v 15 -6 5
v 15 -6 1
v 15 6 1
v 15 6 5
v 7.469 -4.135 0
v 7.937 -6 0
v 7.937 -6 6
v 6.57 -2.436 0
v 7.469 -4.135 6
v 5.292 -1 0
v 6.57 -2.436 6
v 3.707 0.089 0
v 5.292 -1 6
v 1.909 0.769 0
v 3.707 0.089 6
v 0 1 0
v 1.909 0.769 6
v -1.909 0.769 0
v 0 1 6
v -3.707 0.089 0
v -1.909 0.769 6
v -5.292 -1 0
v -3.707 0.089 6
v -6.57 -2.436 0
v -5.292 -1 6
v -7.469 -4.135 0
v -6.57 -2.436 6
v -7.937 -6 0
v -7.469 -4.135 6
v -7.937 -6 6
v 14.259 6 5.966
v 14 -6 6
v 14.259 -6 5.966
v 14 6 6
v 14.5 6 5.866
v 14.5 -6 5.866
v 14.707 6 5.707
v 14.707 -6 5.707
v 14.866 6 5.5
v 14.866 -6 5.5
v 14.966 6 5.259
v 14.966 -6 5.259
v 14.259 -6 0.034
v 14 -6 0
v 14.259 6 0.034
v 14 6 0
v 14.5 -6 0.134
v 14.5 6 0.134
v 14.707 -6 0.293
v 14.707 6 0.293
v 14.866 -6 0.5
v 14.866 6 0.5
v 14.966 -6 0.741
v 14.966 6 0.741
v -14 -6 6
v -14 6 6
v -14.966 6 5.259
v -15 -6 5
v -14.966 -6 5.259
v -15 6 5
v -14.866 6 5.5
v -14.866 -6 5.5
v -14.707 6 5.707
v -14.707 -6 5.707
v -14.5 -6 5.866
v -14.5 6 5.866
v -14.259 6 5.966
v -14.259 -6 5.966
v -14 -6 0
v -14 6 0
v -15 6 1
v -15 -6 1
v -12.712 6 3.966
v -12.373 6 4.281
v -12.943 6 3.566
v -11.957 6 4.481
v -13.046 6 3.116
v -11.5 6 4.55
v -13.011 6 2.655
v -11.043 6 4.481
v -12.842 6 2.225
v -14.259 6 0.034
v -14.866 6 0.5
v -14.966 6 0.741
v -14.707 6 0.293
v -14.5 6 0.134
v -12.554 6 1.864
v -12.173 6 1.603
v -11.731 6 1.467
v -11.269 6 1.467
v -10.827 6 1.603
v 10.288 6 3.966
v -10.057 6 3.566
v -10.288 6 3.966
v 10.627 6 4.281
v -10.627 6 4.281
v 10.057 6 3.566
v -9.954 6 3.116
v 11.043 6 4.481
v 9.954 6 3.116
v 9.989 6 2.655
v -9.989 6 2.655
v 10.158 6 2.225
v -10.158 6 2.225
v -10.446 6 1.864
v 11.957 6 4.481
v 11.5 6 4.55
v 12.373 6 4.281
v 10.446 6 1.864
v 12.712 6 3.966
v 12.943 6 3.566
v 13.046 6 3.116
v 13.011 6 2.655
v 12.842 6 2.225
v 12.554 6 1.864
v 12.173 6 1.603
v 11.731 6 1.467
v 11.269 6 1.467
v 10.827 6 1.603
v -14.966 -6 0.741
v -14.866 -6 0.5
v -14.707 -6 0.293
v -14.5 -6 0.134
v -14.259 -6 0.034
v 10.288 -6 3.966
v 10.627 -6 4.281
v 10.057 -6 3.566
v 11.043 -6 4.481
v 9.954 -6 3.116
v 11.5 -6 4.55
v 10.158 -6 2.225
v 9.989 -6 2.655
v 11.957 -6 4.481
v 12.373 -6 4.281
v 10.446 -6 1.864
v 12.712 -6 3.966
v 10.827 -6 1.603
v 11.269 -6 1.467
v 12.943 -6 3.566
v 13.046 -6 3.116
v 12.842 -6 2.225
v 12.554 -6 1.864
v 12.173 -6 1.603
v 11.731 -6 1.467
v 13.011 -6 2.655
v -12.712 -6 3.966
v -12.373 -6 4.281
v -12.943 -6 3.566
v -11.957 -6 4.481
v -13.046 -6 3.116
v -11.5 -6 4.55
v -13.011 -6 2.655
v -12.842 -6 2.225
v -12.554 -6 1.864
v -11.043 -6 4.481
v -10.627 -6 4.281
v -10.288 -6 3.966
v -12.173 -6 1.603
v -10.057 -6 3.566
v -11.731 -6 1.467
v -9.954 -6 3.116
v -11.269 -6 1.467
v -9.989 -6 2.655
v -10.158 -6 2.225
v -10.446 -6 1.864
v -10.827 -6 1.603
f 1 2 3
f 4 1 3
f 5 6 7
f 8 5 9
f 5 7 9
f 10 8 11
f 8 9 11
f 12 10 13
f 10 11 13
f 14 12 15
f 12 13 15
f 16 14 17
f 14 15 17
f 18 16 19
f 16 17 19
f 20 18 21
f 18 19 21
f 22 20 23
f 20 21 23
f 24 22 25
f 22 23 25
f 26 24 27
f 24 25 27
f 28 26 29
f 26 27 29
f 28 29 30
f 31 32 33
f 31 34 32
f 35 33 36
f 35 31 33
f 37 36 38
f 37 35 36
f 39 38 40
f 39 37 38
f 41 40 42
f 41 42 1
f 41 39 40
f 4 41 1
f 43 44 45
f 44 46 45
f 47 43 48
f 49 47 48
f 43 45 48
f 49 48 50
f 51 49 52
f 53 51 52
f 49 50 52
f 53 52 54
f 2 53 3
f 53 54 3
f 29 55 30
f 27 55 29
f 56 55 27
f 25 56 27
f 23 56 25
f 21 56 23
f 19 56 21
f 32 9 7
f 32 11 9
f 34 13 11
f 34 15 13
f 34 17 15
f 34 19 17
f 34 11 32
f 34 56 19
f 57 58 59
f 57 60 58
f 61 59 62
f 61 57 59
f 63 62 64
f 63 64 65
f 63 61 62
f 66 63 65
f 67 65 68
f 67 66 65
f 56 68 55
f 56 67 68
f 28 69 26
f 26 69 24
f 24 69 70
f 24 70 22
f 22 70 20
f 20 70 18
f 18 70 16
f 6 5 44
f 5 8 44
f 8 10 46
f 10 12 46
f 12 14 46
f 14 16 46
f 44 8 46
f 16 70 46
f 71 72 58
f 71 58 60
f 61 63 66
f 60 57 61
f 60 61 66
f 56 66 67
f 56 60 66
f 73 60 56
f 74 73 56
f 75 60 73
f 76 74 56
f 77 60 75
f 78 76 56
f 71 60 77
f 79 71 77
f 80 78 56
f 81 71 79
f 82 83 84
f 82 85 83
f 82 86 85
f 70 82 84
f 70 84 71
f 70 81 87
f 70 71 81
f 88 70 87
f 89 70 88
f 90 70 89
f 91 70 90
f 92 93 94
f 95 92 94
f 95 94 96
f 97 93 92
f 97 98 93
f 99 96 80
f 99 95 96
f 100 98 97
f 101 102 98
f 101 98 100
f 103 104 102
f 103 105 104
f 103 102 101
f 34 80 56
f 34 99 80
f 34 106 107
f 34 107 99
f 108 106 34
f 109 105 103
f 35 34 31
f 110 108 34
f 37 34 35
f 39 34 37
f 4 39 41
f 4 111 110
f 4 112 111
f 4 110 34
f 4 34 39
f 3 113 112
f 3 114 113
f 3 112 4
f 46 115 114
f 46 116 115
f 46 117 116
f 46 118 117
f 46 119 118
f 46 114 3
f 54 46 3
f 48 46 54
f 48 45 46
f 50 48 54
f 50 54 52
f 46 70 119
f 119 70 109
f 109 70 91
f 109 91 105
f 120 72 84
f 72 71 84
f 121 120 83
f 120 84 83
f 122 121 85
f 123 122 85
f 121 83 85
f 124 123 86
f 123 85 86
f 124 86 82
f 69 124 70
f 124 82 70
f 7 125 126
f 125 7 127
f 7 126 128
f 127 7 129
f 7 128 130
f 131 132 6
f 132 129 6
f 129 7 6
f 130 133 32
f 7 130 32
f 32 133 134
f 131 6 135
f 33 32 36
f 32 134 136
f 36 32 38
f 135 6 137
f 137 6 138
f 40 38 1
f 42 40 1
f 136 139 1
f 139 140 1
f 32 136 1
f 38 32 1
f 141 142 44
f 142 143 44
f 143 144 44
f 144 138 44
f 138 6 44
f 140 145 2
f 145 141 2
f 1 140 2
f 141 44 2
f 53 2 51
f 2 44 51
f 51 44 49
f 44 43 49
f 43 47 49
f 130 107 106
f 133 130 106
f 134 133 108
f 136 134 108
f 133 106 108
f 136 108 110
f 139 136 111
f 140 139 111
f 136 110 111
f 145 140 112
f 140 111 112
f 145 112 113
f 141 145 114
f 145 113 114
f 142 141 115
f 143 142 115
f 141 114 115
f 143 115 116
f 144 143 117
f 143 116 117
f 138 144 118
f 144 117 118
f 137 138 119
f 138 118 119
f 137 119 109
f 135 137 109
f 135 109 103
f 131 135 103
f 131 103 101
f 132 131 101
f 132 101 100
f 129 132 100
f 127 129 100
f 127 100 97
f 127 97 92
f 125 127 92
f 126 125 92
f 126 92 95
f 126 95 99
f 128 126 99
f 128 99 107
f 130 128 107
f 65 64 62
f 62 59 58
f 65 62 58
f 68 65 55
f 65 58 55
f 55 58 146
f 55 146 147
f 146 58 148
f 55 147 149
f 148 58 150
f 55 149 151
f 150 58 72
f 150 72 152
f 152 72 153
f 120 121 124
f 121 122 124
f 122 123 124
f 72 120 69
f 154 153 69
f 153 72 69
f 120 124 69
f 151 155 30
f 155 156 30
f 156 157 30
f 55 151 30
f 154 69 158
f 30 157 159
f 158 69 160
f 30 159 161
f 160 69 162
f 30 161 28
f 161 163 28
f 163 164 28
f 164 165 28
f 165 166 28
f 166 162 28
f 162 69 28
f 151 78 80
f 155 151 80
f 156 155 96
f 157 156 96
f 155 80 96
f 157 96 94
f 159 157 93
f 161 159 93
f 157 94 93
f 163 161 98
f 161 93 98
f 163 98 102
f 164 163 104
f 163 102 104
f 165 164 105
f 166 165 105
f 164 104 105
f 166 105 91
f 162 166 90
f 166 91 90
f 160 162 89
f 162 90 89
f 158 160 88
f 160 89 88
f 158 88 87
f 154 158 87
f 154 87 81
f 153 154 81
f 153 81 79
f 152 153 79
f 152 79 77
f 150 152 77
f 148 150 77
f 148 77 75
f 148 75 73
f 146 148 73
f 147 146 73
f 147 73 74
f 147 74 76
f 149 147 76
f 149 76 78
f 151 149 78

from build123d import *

# Parameters (mm, degrees)
SKETCH1_W           = 30
SKETCH1_H           = 12
BOSS_EXTRUDE1_DEPTH = 6
SKETCH2_R           = 8
CUT_EXTRUDE1_DEPTH  = 18.23368794
SKETCH3_R           = 1.55
CUT_EXTRUDE2_DEPTH  = 21.124611797
FILLET1_R           = 1


with BuildPart() as part:
    # Sketch1 → Boss-Extrude1 (new body)
    with BuildSketch(Plane.XY):
        Rectangle(SKETCH1_W, SKETCH1_H)
    extrude(amount=BOSS_EXTRUDE1_DEPTH)

    # Sketch2 → Cut-Extrude1 (cut, through all)
    with BuildSketch(Plane.XY.offset(6)):
        with Locations((0, -7)):
            Circle(SKETCH2_R)
    extrude(amount=-CUT_EXTRUDE1_DEPTH, mode=Mode.SUBTRACT)

    # Sketch3 → Cut-Extrude2 (cut, through all)
    with BuildSketch(Plane(origin=(0, 6, 0), x_dir=(1, 0, 0), z_dir=(0, 1, 0))):
        with Locations(Location((-11.5, -3, 0), (0, 0, 270))):
            Circle(SKETCH3_R)
        with Locations(Location((11.5, -3, 0), (0, 0, 270))):
            Circle(SKETCH3_R)
    extrude(amount=-CUT_EXTRUDE2_DEPTH, mode=Mode.SUBTRACT)

    # Fillet1
    fillet1_edges = [part.edges().sort_by_distance(p)[0] for p in [
        (-15, 0, 6),
        (15, 0, 6),
        (-15, 0, 0),
        (15, 0, 0),
    ]]
    fillet(fillet1_edges, radius=FILLET1_R)


solid = part.part
